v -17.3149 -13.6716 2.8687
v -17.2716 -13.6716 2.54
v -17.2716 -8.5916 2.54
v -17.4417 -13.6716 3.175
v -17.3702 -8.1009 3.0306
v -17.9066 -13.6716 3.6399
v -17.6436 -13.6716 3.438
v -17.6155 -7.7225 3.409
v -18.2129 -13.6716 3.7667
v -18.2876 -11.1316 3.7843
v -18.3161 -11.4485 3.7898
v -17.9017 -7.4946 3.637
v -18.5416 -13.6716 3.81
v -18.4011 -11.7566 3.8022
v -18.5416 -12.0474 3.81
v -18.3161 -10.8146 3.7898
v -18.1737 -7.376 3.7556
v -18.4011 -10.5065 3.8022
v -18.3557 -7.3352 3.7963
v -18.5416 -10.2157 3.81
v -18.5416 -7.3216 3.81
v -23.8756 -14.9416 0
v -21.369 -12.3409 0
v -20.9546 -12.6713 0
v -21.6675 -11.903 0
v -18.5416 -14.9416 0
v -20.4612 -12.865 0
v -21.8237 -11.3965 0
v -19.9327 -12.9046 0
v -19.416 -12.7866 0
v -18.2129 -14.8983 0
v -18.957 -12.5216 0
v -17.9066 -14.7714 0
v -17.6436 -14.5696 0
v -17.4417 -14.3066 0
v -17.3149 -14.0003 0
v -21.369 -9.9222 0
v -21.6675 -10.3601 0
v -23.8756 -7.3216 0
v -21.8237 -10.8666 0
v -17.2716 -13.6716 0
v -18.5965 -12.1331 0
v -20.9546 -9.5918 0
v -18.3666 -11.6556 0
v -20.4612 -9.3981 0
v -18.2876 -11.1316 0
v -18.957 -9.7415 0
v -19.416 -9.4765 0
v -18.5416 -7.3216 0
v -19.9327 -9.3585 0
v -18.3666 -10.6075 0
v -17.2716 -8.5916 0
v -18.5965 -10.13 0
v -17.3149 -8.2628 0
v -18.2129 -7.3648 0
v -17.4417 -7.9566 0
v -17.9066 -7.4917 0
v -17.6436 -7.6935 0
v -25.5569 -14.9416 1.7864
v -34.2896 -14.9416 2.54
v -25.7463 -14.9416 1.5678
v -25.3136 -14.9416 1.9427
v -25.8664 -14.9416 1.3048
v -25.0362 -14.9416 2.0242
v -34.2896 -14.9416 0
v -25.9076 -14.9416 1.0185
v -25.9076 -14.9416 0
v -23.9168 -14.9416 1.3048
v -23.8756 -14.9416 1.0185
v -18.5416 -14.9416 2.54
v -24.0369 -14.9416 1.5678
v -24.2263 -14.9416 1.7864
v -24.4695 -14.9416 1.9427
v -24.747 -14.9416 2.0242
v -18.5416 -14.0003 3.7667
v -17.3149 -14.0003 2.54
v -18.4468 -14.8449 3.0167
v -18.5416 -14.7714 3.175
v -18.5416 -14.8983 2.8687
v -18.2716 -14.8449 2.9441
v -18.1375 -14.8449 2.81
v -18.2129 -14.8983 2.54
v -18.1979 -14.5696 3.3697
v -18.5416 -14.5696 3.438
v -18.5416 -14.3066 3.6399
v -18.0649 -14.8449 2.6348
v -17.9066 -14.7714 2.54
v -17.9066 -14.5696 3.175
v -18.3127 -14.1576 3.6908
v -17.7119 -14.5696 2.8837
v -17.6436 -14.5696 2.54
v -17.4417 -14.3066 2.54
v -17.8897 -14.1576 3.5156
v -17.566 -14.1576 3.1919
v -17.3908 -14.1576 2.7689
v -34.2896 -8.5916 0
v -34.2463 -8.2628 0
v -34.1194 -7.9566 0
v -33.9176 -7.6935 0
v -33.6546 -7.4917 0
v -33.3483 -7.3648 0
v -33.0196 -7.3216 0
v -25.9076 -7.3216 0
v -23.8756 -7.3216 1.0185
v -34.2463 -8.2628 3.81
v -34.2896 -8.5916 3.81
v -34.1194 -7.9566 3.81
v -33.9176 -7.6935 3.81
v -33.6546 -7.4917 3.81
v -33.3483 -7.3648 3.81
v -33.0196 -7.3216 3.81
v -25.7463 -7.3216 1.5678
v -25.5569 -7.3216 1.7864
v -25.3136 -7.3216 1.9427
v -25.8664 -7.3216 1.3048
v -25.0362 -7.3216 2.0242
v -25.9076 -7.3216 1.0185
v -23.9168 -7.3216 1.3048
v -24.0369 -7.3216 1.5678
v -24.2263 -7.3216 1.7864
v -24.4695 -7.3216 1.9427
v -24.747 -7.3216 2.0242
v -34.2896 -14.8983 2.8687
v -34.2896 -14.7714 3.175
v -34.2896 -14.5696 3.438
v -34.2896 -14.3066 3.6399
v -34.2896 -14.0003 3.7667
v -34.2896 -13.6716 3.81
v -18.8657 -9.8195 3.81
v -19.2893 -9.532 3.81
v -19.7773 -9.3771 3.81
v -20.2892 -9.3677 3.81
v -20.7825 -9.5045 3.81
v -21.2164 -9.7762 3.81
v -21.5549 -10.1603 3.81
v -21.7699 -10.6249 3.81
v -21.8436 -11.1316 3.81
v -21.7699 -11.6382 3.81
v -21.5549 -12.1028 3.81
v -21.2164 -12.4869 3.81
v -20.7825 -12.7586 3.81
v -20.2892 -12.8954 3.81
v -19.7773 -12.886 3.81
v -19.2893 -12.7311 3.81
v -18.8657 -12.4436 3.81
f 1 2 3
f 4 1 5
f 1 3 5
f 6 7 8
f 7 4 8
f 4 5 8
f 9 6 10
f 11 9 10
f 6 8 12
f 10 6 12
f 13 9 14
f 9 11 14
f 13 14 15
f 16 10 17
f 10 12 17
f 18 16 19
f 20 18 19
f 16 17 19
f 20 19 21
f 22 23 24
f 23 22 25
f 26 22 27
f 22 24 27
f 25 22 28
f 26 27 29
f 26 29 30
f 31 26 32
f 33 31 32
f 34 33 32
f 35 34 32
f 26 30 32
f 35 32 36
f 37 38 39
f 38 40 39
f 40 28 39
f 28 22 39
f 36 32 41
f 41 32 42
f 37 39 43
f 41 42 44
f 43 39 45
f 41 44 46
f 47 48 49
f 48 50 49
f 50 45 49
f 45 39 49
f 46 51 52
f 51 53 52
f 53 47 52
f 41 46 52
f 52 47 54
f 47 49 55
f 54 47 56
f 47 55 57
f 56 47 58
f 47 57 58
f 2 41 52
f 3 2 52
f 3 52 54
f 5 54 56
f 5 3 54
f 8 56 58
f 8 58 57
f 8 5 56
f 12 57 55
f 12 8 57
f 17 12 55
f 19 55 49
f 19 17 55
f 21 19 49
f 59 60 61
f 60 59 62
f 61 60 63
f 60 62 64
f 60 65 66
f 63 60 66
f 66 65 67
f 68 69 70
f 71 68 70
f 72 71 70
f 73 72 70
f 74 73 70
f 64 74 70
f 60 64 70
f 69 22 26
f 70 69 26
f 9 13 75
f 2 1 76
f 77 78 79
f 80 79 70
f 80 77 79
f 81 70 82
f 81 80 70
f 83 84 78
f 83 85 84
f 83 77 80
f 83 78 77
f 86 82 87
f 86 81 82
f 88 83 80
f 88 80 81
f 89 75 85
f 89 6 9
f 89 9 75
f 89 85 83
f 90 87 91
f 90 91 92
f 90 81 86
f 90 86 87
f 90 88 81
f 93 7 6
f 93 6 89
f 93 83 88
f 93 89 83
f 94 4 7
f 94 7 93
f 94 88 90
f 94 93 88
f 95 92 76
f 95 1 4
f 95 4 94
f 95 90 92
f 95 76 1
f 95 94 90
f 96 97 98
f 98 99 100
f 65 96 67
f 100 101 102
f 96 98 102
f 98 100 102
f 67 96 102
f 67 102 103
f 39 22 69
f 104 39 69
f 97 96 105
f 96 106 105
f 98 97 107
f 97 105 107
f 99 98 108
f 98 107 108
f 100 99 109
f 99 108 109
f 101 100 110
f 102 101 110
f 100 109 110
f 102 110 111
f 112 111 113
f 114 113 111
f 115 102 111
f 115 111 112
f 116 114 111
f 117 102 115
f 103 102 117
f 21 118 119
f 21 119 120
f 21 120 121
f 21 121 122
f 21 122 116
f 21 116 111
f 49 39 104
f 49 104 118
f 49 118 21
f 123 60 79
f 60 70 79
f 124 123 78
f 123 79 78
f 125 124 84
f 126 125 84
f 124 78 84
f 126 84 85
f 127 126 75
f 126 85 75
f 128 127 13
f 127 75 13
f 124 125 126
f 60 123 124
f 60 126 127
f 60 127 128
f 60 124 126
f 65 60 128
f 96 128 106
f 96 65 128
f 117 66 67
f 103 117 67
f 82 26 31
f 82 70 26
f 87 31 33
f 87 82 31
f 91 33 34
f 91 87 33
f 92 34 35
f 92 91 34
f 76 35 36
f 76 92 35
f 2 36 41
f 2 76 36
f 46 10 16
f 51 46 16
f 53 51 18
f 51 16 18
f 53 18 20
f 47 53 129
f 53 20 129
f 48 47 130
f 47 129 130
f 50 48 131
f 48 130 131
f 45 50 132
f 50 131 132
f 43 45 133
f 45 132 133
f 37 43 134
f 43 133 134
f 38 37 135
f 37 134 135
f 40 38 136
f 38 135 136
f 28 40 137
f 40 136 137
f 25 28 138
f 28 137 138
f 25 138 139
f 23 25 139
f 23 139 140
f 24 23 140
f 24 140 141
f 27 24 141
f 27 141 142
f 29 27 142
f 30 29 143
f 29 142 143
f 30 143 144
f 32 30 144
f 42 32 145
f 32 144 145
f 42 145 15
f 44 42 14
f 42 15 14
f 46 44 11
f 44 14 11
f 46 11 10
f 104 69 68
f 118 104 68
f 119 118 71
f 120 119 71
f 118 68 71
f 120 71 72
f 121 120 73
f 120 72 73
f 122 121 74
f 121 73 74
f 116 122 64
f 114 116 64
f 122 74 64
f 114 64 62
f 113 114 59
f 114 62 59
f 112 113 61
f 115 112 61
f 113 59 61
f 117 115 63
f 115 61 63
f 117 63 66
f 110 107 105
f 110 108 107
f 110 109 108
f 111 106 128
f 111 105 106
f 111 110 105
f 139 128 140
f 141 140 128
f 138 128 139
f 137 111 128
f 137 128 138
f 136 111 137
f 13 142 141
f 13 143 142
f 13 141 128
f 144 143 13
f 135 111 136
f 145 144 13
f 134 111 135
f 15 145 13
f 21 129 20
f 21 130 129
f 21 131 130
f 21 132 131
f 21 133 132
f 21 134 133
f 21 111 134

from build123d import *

# Parameters (mm, degrees)
SKETCH1_W           = 17.018
SKETCH1_H           = 7.62
BOSS_EXTRUDE1_DEPTH = 3.81
FILLET1_R           = 1.27
CUT_EXTRUDE8_REACH  = 37.332
CUT_EXTRUDE9_REACH  = 39.597
SKETCH4_R           = 1.778


with BuildPart() as part:
    # Sketch1 → Boss-Extrude1 (new body)
    with BuildSketch(Plane.XY):
        with Locations((-25.78059107, -11.13155)):
            Rectangle(SKETCH1_W, SKETCH1_H)
    extrude(amount=BOSS_EXTRUDE1_DEPTH)

    # Fillet1
    fillet1_edges = [part.edges().sort_by_distance(p)[0] for p in [
        (-17.27159107, -11.13155, 3.81),
        (-25.78059107, -14.94155, 3.81),
        (-34.28959107, -7.32155, 1.905),
        (-17.27159107, -7.32155, 1.905),
        (-17.27159107, -14.94155, 1.905),
    ]]
    fillet(fillet1_edges, radius=FILLET1_R)

    # Sketch3 → Cut-Extrude8 (cut, up to next)
    with BuildSketch(Plane.XZ.offset(14.94155), mode=Mode.PRIVATE) as cut_extrude8_sk1:
        with BuildLine():
            Line((-23.87560377, 0), (-23.87560377, 1.01854))
            ThreePointArc((-23.87560377, 1.01854), (-24.89159107, 2.0345273), (-25.90757837, 1.01854))
            Line((-25.90757837, 1.01854), (-25.90757837, 0))
            Line((-25.90757837, 0), (-23.87560377, 0))
        make_face()
    cut_extrude8_tool1 = extrude(cut_extrude8_sk1.sketch, amount=-CUT_EXTRUDE8_REACH, mode=Mode.PRIVATE) & part.part
    add(cut_extrude8_tool1.solids().sort_by_distance((-24.891591, -14.94155, 0.922401))[0], mode=Mode.SUBTRACT)

    # Sketch4 → Cut-Extrude9 (cut, up to next)
    with BuildSketch(Plane.XY.offset(3.81), mode=Mode.PRIVATE) as cut_extrude9_sk1:
        with Locations((-20.06559107, -11.13155)):
            Circle(SKETCH4_R)
    cut_extrude9_tool1 = extrude(cut_extrude9_sk1.sketch, amount=-CUT_EXTRUDE9_REACH, mode=Mode.PRIVATE) & part.part
    add(cut_extrude9_tool1.solids().sort_by_distance((-20.065591, -11.13155, 3.81))[0], mode=Mode.SUBTRACT)


solid = part.part
